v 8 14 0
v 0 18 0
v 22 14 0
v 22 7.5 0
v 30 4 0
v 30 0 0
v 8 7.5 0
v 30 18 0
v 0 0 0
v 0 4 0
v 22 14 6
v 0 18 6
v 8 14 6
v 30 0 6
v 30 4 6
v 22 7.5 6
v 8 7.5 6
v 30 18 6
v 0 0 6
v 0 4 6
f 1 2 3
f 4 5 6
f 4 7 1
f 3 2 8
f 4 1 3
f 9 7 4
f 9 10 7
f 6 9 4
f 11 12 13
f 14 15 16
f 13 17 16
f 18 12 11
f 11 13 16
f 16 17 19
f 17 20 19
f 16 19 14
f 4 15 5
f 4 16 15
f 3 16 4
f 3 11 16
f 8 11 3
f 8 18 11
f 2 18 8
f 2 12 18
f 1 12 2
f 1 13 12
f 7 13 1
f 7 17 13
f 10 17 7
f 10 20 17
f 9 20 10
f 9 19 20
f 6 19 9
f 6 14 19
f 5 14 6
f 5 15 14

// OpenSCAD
$fn = 32;

// ----------------------------------------------------------------------
// Key bar: dovetail key, 6 mm thick
// ----------------------------------------------------------------------

// --- parameters (mm) ---
profile_height = 6;       // extrusion height
profile_points = 10;      // points of the closed outline

profile = [[0, 0], [30, 0], [30, 4], [22, 7.5], [22, 14], [30, 18], [0, 18], [8, 14], [8, 7.5], [0, 4]];  // single closed polygon, 10 points, counter clockwise

// --- the one profile operation ---
linear_extrude(height = profile_height) polygon(points = profile);
